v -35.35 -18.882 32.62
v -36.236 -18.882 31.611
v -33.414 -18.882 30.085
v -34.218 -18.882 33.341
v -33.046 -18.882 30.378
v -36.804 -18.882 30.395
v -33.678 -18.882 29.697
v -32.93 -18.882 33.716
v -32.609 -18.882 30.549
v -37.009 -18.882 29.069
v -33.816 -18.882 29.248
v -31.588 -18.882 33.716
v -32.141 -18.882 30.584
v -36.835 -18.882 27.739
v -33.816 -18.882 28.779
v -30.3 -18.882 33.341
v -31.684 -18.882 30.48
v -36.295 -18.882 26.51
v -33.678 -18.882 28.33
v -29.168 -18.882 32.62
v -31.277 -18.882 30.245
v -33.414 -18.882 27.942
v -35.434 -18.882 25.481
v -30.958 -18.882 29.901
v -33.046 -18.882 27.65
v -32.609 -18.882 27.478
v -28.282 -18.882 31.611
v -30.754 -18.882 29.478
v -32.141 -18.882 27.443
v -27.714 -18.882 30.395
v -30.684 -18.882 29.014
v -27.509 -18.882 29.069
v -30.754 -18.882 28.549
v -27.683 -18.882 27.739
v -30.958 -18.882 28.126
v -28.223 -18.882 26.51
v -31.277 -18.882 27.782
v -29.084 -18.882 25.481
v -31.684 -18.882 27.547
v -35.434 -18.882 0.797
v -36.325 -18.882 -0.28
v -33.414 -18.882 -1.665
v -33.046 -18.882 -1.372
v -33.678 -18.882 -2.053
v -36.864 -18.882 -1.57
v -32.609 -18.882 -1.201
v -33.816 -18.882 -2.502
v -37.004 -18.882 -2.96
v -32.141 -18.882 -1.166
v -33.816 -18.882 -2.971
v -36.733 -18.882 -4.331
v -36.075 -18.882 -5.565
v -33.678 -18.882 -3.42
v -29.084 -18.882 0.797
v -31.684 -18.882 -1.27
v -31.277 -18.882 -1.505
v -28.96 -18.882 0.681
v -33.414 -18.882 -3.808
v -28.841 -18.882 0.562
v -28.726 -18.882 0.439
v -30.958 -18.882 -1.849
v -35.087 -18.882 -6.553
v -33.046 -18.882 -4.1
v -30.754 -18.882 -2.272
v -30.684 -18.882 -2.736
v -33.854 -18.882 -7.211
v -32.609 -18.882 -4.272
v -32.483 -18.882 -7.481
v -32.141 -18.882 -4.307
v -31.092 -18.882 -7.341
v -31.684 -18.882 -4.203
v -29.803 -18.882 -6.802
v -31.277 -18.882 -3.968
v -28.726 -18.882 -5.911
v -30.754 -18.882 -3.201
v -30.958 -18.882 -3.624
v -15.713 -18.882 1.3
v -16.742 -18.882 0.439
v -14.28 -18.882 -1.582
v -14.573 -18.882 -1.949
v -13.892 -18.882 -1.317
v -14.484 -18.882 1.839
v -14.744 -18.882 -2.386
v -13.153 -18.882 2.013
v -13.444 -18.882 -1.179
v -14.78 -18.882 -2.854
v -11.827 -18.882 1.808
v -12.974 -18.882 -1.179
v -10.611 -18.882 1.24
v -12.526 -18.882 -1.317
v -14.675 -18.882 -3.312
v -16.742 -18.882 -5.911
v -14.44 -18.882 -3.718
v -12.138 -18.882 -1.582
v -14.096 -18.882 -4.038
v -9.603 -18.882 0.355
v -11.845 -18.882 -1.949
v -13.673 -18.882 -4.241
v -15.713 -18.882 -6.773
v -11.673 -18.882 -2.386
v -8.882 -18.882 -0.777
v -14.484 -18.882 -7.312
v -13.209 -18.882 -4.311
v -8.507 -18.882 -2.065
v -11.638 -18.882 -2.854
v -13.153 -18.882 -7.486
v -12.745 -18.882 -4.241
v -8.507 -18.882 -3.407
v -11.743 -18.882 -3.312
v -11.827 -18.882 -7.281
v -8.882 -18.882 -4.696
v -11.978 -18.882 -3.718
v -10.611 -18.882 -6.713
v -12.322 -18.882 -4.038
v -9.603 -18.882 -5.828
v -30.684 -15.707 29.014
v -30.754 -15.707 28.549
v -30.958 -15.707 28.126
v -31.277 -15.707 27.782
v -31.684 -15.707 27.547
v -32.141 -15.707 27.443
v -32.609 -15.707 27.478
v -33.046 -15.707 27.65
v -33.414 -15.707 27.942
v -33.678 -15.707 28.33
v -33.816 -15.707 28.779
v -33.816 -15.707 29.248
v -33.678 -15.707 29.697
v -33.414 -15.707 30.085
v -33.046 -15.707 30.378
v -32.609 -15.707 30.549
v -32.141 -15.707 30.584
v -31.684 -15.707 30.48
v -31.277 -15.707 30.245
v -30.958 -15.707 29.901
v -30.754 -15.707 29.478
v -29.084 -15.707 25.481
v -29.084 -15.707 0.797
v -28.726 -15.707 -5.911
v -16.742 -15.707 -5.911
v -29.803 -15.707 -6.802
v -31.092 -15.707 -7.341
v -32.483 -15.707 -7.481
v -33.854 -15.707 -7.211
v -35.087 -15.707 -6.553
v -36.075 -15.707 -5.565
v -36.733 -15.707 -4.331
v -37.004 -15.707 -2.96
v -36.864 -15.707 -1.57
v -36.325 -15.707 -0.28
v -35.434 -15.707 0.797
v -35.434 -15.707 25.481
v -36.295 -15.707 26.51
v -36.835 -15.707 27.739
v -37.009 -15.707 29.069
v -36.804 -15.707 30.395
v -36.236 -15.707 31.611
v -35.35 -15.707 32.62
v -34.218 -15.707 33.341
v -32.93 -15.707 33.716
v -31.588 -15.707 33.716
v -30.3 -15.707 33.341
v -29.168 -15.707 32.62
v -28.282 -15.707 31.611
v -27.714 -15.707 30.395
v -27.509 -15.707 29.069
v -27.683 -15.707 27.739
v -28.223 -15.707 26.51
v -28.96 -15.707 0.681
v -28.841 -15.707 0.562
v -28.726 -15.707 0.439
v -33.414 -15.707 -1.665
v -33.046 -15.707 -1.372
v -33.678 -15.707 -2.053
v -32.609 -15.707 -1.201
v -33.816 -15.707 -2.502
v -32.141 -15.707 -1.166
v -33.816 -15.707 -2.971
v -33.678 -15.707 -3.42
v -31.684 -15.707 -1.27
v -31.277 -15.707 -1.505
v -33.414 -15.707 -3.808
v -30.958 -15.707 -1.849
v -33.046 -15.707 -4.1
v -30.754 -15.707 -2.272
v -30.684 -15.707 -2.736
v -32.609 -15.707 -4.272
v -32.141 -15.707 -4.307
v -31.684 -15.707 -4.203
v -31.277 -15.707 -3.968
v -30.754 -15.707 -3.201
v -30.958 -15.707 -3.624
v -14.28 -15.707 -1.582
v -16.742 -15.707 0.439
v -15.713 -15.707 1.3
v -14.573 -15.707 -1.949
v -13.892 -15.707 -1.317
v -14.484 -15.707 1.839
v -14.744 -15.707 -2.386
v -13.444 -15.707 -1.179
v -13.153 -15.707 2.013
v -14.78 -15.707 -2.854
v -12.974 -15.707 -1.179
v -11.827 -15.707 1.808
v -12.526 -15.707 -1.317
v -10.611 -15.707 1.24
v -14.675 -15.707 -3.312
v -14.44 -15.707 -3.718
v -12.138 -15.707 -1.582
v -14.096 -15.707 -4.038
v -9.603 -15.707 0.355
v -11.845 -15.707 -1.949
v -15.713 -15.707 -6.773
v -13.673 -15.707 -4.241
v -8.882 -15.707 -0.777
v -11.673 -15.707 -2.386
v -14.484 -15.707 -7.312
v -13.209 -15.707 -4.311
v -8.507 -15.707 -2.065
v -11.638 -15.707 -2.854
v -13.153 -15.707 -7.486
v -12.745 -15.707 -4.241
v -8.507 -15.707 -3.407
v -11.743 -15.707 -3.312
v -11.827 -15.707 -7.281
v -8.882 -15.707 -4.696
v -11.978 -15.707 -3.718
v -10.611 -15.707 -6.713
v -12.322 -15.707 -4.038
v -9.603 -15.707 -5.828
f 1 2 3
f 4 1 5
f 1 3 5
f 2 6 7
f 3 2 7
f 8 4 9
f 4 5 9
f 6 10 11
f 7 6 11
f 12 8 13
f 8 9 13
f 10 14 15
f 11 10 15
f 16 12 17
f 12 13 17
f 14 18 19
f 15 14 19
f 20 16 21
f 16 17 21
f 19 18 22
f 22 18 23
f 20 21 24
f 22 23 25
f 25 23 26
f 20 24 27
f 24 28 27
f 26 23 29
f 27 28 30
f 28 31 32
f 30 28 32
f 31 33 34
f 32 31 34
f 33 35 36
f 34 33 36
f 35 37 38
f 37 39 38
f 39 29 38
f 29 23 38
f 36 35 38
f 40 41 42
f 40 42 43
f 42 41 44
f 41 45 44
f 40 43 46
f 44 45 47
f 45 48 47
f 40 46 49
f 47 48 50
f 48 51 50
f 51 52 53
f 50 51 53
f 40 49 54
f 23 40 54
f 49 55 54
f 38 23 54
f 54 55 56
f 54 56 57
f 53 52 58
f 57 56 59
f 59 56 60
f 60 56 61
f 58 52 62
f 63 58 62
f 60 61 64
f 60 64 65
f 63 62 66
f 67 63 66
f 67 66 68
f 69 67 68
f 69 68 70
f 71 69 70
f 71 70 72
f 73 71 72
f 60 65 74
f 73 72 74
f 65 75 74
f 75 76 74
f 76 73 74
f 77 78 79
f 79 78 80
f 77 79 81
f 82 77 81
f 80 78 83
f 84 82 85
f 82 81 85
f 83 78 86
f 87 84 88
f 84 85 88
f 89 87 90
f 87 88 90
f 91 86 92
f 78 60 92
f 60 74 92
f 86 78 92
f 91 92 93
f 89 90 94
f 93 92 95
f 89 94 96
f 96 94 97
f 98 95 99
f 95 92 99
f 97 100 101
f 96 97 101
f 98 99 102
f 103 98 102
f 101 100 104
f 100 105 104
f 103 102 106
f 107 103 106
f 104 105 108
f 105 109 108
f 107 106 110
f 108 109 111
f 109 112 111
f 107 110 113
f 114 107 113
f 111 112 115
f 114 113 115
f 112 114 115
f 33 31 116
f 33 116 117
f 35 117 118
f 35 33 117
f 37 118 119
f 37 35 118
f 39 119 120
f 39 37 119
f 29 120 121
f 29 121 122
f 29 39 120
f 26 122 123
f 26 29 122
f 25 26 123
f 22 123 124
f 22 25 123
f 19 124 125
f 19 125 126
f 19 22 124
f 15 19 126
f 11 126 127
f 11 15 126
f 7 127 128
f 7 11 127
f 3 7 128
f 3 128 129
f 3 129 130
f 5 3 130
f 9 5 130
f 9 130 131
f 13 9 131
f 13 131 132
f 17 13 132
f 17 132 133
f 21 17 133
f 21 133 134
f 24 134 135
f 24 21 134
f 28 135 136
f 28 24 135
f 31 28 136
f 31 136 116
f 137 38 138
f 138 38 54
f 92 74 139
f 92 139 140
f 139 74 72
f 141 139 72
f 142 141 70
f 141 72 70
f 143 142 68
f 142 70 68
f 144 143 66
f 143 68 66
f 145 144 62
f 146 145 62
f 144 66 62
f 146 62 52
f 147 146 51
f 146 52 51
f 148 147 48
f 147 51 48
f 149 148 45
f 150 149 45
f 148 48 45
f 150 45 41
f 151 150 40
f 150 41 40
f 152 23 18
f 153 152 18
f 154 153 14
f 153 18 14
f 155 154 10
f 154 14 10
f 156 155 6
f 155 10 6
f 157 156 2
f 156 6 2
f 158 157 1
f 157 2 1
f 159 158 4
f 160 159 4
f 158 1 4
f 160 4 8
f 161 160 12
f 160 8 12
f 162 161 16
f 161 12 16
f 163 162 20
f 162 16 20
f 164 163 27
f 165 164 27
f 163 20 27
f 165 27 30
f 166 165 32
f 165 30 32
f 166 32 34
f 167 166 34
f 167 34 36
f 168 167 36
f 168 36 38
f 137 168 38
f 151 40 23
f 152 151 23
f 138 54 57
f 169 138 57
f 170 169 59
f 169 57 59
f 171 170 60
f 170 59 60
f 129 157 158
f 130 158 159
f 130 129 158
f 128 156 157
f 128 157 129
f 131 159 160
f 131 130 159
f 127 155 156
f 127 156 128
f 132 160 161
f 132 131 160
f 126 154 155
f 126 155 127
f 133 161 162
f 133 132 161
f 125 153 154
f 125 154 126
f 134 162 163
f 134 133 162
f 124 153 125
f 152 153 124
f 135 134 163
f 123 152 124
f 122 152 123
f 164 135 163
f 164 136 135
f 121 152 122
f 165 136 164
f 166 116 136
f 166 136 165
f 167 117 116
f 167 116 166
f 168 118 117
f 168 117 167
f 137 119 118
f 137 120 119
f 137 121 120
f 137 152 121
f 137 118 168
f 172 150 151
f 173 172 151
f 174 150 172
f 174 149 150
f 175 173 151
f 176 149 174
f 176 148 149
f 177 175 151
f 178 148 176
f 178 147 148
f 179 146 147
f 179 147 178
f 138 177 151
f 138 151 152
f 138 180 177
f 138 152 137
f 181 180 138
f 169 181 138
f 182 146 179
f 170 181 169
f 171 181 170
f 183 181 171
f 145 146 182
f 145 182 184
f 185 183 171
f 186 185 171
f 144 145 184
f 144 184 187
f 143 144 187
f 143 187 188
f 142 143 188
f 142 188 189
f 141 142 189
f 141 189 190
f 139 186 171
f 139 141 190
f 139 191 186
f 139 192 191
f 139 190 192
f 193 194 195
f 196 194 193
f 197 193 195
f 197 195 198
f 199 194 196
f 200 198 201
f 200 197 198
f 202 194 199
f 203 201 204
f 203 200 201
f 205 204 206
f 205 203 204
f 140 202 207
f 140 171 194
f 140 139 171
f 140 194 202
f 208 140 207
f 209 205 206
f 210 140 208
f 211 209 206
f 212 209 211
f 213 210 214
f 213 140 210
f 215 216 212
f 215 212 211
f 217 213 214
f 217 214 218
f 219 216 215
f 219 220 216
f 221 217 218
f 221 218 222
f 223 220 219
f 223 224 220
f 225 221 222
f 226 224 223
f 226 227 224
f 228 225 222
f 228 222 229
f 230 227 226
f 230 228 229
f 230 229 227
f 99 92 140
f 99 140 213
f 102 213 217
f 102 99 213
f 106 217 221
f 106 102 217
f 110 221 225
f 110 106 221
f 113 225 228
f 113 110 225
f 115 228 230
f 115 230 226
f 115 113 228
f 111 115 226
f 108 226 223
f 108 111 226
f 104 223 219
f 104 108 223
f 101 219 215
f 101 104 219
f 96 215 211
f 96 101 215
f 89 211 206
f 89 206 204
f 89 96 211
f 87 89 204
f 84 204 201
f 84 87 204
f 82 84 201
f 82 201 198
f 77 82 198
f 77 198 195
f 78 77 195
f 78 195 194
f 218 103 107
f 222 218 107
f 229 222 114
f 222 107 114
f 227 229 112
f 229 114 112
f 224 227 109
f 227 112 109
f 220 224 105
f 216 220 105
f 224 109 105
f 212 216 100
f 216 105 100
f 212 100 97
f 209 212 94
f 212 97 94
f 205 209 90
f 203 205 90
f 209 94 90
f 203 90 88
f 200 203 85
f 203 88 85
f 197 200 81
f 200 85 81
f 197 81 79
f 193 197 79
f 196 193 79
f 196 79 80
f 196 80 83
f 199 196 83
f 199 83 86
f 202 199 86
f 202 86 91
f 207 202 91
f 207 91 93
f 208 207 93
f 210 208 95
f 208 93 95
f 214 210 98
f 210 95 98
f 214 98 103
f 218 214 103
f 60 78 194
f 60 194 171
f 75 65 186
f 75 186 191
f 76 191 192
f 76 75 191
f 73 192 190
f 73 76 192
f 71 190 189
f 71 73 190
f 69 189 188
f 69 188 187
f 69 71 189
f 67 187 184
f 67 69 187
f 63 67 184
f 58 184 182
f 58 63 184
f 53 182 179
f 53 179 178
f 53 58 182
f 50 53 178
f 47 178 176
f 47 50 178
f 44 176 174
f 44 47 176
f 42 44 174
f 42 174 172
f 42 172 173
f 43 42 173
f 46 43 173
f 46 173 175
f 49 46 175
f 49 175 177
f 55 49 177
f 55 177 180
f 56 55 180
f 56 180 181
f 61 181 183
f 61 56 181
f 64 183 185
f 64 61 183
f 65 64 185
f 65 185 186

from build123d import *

# Parameters (mm, degrees)
LIFT_ARM_START         = -18.881702924
LIFT_ARM_OUTLINE_R     = 1.575
LIFT_ARM_DEPTH         = 3.175
LIFT_ARM_SKETCH_R      = 1.575
LIFT_ARM_EXTRUDE_DEPTH = 3.175


# Read off the part's stored shape, not the designer's step: Lift_Arm
with BuildPart() as part:
    # Lift_Arm outline → Lift_Arm (new body)
    with BuildSketch(Plane(origin=(0, 0, 0), x_dir=(1, 0, 0), z_dir=(0, 1, 0)).offset(LIFT_ARM_START)):
        with BuildLine():
            ThreePointArc((-35.433976258, -25.480614034), (-32.258976258, -33.763583748), (-29.083976258, -25.480614034))
            Line((-29.083976258, -25.480614034), (-29.083976258, -0.796553462))
            ThreePointArc((-29.083976258, -0.796553462), (-32.258976258, 7.486416252), (-35.433976258, -0.796553462))
            Line((-35.433976258, -0.796553462), (-35.433976258, -25.480614034))
        make_face()
        with Locations((-32.258976258, -29.013583748)):
            Circle(LIFT_ARM_OUTLINE_R, mode=Mode.SUBTRACT)
        with Locations((-32.258976258, 2.736416252)):
            Circle(LIFT_ARM_OUTLINE_R, mode=Mode.SUBTRACT)
    extrude(amount=LIFT_ARM_DEPTH)

    # Lift Arm Sketch → Lift Arm Extrude (add)
    with BuildSketch(Plane.XZ.offset(18.881702924)):
        with BuildLine():
            ThreePointArc((-28.726006544, 0.438583748), (-27.508976258, -2.736416252), (-28.726006544, -5.911416252))
            Line((-28.726006544, -5.911416252), (-16.741945972, -5.911416252))
            ThreePointArc((-16.741945972, -5.911416252), (-8.458976258, -2.736416252), (-16.741945972, 0.438583748))
            Line((-16.741945972, 0.438583748), (-28.726006544, 0.438583748))
        make_face()
        with Locations(Location((-13.208976258, -2.736416252, 0), (0, 0, 270))):
            Circle(LIFT_ARM_SKETCH_R, mode=Mode.SUBTRACT)
    extrude(amount=-LIFT_ARM_EXTRUDE_DEPTH)


solid = part.part
